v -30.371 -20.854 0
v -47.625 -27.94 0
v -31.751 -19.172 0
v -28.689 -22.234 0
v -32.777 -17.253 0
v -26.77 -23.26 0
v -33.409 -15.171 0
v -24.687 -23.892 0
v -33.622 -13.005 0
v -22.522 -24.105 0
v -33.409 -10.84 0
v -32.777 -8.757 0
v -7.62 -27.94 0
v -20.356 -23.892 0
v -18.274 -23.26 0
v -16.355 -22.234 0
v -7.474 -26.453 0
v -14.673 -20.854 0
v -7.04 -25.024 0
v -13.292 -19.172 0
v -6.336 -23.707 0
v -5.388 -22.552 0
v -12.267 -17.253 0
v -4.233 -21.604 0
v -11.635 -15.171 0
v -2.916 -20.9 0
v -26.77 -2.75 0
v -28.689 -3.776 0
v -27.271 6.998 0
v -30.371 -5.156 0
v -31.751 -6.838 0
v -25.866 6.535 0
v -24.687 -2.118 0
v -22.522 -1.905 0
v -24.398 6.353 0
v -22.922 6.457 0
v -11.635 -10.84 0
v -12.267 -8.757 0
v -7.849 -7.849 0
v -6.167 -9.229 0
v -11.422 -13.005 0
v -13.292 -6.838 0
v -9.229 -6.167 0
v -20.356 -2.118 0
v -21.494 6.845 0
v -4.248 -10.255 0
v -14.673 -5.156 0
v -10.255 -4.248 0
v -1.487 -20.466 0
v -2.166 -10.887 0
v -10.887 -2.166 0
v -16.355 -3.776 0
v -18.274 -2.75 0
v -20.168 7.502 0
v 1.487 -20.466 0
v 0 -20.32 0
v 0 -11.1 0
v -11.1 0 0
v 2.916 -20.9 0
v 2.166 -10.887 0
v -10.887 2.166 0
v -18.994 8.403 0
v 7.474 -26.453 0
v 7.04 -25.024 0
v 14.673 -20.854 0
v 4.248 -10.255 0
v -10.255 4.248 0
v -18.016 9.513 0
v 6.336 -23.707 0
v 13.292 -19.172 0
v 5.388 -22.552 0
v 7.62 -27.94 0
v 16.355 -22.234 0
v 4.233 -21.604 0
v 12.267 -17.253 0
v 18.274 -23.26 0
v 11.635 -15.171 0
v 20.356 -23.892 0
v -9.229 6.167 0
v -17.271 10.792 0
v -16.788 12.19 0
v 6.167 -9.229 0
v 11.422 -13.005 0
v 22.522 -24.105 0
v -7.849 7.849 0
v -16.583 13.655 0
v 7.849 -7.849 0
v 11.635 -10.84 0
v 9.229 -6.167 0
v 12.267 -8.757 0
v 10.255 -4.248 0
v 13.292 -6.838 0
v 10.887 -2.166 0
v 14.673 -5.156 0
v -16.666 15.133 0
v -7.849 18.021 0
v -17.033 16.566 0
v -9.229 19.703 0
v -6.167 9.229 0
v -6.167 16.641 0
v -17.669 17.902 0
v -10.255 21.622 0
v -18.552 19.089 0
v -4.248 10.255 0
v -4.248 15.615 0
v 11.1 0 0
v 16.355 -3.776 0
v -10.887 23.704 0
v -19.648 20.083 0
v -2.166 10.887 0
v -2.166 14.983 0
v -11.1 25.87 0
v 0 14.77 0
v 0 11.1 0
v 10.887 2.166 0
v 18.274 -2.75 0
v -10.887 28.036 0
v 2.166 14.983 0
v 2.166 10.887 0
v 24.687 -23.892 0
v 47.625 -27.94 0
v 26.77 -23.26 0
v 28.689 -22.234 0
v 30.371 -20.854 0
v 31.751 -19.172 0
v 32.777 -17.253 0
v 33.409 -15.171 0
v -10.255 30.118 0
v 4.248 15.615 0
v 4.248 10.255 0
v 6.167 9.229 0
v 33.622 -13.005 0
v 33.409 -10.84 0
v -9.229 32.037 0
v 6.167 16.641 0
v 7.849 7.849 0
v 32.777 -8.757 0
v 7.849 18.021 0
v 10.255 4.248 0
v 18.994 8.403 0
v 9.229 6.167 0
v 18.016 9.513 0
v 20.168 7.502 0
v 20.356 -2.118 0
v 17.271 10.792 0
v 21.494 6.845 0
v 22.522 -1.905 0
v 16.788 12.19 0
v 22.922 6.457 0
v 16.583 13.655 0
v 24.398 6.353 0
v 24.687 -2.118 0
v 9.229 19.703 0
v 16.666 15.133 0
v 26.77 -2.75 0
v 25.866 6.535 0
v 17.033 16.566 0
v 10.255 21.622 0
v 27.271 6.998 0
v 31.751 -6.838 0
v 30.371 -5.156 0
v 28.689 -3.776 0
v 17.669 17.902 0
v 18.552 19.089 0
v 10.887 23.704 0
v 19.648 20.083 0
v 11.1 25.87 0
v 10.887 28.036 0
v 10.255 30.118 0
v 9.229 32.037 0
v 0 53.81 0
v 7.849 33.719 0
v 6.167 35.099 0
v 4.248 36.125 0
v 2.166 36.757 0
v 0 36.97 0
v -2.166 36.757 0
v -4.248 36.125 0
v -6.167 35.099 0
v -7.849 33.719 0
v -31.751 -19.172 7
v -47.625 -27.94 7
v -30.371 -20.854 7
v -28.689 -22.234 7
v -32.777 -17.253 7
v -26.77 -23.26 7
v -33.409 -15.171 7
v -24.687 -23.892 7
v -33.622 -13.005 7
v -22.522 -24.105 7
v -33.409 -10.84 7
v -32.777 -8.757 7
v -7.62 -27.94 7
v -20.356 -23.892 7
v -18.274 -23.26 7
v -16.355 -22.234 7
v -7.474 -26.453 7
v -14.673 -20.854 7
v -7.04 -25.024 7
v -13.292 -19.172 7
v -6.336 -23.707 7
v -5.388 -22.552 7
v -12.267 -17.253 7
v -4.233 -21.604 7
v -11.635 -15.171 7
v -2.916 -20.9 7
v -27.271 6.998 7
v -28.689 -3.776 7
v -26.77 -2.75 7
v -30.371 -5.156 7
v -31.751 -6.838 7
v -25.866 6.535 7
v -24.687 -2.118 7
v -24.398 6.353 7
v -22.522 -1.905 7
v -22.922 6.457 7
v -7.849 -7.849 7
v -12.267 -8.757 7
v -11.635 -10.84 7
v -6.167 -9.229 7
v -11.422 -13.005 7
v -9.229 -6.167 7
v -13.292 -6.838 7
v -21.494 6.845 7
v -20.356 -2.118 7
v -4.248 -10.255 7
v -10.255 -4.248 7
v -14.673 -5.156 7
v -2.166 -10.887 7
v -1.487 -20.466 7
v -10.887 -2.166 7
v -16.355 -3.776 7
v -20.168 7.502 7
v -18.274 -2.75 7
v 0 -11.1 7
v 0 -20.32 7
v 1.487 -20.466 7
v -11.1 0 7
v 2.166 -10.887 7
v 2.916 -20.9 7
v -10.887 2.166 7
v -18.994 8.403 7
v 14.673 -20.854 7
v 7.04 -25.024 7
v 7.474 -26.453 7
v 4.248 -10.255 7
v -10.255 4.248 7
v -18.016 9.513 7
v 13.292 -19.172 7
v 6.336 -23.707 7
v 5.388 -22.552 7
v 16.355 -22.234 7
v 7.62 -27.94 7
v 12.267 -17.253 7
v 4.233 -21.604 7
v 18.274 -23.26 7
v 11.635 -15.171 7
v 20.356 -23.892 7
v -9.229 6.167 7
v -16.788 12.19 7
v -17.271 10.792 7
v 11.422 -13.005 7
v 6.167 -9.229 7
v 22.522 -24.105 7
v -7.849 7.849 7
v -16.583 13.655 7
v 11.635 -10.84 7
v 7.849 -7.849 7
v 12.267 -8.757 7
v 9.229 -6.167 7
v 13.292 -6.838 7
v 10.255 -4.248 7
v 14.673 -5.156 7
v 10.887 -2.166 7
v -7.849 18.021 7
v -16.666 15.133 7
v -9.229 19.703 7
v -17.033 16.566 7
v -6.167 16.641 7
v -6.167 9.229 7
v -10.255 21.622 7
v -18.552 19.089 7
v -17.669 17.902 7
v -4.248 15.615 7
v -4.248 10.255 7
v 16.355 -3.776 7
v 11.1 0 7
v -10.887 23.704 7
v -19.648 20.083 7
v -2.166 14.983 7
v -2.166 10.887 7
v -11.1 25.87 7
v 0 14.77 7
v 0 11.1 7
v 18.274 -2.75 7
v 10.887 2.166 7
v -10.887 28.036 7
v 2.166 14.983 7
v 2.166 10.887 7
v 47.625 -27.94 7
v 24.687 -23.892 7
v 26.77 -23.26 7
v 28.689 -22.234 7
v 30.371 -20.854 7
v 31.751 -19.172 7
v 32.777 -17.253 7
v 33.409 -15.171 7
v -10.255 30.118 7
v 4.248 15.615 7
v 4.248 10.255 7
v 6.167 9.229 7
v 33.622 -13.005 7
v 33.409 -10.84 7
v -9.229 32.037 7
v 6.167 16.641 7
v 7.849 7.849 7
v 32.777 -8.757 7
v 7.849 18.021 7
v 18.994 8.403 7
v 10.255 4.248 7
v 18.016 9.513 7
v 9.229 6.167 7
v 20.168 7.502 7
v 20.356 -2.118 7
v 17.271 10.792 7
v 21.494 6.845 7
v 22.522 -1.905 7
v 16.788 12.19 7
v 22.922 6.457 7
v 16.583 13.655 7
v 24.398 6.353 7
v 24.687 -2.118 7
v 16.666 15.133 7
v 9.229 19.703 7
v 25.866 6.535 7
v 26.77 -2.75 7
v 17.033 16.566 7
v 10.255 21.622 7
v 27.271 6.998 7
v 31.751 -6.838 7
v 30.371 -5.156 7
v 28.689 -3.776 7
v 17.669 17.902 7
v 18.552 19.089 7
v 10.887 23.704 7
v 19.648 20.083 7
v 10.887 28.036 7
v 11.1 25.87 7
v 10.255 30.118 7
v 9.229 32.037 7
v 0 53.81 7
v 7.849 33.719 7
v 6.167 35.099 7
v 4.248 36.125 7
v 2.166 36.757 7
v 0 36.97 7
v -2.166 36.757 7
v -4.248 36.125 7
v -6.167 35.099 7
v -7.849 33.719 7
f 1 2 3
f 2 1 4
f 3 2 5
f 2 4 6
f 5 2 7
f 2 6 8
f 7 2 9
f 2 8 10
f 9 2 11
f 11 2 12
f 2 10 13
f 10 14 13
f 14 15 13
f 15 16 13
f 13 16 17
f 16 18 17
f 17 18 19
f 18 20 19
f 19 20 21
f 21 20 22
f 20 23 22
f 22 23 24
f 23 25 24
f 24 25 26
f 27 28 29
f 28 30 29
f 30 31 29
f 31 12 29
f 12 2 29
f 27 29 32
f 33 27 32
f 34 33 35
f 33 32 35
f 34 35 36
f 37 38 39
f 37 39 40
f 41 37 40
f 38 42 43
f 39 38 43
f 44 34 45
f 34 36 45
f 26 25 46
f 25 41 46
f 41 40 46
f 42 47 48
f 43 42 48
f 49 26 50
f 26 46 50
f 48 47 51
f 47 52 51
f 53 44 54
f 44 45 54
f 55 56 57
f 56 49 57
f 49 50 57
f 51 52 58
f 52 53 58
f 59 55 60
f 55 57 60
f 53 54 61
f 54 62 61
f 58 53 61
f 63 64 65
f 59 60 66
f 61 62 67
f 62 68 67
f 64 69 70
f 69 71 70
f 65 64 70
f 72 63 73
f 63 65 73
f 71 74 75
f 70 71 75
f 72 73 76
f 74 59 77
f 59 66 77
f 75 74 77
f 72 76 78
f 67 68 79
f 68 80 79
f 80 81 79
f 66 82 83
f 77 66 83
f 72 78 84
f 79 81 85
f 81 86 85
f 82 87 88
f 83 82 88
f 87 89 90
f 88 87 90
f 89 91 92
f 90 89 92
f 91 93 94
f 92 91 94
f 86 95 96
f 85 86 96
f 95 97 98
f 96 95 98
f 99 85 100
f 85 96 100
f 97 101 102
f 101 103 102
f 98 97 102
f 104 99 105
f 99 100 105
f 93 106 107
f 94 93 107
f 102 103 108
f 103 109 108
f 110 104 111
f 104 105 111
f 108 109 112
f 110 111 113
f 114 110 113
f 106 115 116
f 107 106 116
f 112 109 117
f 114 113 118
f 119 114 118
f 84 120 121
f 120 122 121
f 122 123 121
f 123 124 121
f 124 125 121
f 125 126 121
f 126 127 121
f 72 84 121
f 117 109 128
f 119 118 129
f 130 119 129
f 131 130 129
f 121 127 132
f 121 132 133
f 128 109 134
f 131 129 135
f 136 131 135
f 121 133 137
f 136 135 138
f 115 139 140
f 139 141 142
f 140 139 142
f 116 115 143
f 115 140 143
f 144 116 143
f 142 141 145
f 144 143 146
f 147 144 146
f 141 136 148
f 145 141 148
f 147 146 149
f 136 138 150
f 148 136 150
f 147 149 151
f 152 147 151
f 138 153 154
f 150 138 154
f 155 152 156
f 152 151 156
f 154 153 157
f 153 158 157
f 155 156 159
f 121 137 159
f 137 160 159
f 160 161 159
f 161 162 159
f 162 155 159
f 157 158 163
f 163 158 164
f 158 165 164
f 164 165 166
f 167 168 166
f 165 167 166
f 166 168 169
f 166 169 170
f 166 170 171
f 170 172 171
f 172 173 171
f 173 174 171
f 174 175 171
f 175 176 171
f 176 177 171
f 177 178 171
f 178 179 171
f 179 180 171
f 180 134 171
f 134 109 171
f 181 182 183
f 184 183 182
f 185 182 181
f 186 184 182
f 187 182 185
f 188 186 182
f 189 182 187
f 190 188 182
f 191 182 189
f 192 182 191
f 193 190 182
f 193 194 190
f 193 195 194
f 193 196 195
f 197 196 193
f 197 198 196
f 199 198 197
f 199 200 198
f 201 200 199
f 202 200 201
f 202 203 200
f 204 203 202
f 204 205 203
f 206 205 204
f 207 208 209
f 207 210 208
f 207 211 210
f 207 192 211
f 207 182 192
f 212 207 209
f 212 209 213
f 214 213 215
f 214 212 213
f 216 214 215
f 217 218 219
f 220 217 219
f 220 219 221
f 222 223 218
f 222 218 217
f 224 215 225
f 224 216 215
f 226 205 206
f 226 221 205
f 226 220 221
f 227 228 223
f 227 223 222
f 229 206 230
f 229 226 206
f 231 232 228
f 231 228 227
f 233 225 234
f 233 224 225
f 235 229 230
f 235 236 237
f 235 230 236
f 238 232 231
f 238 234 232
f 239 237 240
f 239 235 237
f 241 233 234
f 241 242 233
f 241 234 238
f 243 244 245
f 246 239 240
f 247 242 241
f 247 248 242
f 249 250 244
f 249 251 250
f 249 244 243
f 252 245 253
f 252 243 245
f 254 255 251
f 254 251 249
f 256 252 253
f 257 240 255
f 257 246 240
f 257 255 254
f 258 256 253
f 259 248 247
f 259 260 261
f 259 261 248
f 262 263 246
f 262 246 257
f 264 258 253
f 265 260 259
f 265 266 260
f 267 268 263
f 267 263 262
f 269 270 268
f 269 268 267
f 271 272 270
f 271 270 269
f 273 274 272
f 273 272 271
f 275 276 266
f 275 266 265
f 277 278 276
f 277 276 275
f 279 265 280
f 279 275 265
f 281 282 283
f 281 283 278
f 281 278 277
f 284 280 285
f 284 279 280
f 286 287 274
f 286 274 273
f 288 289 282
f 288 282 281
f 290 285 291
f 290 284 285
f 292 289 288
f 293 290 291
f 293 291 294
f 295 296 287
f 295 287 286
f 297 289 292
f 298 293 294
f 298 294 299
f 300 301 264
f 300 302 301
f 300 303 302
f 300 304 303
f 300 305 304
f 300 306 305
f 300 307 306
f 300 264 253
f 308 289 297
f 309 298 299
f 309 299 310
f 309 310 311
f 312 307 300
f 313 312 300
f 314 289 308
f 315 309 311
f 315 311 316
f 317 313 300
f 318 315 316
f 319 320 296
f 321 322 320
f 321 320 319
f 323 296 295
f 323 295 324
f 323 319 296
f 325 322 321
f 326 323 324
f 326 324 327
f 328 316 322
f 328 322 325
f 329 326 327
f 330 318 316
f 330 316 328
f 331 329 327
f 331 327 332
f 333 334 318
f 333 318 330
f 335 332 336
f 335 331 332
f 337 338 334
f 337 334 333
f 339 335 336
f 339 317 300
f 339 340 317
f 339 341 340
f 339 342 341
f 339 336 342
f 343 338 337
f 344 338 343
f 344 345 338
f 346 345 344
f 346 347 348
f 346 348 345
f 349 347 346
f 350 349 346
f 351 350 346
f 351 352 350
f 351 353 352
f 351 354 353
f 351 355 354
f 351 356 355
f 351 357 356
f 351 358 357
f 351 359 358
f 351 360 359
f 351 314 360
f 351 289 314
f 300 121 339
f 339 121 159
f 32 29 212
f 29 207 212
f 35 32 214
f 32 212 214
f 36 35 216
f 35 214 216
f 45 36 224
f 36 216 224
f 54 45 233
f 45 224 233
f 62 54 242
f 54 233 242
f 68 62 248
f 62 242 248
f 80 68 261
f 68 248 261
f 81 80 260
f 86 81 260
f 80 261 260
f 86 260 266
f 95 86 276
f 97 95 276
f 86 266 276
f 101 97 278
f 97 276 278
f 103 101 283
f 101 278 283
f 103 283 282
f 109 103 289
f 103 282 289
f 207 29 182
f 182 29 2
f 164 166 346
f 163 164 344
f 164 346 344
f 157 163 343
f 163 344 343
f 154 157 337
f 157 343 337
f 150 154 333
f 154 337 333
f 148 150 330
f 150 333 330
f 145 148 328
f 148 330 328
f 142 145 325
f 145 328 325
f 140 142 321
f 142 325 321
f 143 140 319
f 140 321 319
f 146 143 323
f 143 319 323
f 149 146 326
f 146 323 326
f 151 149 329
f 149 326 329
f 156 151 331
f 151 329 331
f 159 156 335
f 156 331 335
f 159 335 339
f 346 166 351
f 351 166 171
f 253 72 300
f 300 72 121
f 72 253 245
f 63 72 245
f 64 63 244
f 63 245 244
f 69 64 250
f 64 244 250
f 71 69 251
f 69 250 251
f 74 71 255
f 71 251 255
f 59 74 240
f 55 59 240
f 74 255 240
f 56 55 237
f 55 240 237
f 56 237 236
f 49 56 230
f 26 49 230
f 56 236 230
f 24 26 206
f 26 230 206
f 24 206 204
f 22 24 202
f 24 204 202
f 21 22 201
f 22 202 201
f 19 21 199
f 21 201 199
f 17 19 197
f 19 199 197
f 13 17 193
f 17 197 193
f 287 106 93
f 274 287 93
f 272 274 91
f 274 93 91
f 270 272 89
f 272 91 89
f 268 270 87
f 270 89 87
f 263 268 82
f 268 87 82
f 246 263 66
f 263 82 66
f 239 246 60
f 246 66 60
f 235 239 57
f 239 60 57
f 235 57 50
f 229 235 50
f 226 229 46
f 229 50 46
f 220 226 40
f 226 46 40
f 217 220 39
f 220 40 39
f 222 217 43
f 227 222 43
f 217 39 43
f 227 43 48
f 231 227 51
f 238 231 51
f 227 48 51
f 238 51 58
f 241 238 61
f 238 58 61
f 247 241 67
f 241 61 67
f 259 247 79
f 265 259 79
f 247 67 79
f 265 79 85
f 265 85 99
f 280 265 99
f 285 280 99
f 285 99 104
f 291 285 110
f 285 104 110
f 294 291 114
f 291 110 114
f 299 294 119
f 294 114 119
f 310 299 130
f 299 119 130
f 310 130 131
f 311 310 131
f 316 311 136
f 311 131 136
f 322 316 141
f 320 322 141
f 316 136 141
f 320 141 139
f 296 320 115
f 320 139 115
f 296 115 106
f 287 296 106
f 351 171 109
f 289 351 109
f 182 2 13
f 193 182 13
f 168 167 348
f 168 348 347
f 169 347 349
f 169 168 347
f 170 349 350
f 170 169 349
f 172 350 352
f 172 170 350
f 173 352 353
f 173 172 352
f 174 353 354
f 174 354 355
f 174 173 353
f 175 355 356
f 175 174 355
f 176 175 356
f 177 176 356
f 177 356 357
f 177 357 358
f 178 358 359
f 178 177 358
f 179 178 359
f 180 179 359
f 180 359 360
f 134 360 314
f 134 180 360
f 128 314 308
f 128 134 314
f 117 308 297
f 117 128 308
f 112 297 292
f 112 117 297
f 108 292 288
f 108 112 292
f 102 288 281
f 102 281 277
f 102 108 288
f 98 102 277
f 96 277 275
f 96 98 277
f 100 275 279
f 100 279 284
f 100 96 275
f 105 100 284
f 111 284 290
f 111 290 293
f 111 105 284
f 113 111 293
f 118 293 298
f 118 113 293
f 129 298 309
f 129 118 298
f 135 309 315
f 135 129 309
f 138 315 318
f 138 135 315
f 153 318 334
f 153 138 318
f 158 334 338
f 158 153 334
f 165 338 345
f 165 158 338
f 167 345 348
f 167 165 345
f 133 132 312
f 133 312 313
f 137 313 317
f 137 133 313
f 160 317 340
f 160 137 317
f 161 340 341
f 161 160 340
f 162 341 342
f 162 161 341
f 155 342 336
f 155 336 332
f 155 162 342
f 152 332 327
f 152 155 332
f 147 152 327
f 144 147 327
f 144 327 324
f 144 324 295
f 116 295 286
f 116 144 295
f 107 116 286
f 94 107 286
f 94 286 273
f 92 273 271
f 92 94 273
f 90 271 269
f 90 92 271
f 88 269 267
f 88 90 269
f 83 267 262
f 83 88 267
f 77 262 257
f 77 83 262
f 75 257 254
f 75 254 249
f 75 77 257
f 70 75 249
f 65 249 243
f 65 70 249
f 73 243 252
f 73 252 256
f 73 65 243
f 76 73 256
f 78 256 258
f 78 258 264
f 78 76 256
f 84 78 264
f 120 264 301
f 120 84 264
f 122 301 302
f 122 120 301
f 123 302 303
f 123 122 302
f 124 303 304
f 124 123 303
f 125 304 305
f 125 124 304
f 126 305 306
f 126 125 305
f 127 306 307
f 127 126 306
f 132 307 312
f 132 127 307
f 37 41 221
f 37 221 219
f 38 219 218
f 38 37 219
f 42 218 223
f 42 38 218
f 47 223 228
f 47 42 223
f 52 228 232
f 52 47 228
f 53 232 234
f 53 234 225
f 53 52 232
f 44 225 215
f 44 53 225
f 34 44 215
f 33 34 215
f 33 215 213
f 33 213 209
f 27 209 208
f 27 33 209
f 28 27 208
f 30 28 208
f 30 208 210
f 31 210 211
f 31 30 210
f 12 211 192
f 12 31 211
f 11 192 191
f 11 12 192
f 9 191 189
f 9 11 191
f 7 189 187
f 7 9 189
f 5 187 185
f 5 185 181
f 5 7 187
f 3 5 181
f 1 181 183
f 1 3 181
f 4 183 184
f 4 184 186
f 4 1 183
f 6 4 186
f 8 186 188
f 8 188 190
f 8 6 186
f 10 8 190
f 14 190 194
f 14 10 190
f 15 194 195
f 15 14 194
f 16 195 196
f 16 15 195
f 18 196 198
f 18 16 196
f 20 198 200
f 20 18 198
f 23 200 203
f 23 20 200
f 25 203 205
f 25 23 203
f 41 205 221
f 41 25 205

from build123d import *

# Parameters (mm, degrees)
F0_R     = 11.1
F1_DEPTH = 7
F2_R     = 7.62
F3_DEPTH = 25.4


with BuildPart() as f1:
    # F0 (on Top) → F1 (new body)
    with BuildSketch(Plane.XY):
        with BuildLine():
            ThreePointArc((0, -11.1), (7.848885, -7.848885), (11.1, 0))
            ThreePointArc((11.1, 0), (-7.848885, 7.848885), (0, -11.1))
        make_face()
        Polygon((-47.625, -27.94), (0, -27.94), (47.625, -27.94), (0, 53.81), align=None)
        with Locations((-22.521795, -13.005035)):
            Circle(F0_R, mode=Mode.SUBTRACT)
        with Locations((22.521795, -13.005035)):
            Circle(F0_R, mode=Mode.SUBTRACT)
        with BuildLine():
            ThreePointArc((0, -11.1), (-7.848885, 7.848885), (11.1, 0))
            ThreePointArc((11.1, 0), (7.848885, -7.848885), (0, -11.1))
        make_face(mode=Mode.SUBTRACT)
        with Locations((0, 25.87)):
            Circle(F0_R, mode=Mode.SUBTRACT)
    extrude(amount=F1_DEPTH)

    # F2 (on face) → F3 (cut)
    with BuildSketch(Plane.XY.offset(7)):
        with Locations((0, -27.94)):
            Circle(F2_R)
        with Locations((24.19675, 13.97)):
            Circle(F2_R)
        with Locations((-24.19675, 13.97)):
            Circle(F2_R)
    extrude(amount=-F3_DEPTH, mode=Mode.SUBTRACT)


solid = f1.part
